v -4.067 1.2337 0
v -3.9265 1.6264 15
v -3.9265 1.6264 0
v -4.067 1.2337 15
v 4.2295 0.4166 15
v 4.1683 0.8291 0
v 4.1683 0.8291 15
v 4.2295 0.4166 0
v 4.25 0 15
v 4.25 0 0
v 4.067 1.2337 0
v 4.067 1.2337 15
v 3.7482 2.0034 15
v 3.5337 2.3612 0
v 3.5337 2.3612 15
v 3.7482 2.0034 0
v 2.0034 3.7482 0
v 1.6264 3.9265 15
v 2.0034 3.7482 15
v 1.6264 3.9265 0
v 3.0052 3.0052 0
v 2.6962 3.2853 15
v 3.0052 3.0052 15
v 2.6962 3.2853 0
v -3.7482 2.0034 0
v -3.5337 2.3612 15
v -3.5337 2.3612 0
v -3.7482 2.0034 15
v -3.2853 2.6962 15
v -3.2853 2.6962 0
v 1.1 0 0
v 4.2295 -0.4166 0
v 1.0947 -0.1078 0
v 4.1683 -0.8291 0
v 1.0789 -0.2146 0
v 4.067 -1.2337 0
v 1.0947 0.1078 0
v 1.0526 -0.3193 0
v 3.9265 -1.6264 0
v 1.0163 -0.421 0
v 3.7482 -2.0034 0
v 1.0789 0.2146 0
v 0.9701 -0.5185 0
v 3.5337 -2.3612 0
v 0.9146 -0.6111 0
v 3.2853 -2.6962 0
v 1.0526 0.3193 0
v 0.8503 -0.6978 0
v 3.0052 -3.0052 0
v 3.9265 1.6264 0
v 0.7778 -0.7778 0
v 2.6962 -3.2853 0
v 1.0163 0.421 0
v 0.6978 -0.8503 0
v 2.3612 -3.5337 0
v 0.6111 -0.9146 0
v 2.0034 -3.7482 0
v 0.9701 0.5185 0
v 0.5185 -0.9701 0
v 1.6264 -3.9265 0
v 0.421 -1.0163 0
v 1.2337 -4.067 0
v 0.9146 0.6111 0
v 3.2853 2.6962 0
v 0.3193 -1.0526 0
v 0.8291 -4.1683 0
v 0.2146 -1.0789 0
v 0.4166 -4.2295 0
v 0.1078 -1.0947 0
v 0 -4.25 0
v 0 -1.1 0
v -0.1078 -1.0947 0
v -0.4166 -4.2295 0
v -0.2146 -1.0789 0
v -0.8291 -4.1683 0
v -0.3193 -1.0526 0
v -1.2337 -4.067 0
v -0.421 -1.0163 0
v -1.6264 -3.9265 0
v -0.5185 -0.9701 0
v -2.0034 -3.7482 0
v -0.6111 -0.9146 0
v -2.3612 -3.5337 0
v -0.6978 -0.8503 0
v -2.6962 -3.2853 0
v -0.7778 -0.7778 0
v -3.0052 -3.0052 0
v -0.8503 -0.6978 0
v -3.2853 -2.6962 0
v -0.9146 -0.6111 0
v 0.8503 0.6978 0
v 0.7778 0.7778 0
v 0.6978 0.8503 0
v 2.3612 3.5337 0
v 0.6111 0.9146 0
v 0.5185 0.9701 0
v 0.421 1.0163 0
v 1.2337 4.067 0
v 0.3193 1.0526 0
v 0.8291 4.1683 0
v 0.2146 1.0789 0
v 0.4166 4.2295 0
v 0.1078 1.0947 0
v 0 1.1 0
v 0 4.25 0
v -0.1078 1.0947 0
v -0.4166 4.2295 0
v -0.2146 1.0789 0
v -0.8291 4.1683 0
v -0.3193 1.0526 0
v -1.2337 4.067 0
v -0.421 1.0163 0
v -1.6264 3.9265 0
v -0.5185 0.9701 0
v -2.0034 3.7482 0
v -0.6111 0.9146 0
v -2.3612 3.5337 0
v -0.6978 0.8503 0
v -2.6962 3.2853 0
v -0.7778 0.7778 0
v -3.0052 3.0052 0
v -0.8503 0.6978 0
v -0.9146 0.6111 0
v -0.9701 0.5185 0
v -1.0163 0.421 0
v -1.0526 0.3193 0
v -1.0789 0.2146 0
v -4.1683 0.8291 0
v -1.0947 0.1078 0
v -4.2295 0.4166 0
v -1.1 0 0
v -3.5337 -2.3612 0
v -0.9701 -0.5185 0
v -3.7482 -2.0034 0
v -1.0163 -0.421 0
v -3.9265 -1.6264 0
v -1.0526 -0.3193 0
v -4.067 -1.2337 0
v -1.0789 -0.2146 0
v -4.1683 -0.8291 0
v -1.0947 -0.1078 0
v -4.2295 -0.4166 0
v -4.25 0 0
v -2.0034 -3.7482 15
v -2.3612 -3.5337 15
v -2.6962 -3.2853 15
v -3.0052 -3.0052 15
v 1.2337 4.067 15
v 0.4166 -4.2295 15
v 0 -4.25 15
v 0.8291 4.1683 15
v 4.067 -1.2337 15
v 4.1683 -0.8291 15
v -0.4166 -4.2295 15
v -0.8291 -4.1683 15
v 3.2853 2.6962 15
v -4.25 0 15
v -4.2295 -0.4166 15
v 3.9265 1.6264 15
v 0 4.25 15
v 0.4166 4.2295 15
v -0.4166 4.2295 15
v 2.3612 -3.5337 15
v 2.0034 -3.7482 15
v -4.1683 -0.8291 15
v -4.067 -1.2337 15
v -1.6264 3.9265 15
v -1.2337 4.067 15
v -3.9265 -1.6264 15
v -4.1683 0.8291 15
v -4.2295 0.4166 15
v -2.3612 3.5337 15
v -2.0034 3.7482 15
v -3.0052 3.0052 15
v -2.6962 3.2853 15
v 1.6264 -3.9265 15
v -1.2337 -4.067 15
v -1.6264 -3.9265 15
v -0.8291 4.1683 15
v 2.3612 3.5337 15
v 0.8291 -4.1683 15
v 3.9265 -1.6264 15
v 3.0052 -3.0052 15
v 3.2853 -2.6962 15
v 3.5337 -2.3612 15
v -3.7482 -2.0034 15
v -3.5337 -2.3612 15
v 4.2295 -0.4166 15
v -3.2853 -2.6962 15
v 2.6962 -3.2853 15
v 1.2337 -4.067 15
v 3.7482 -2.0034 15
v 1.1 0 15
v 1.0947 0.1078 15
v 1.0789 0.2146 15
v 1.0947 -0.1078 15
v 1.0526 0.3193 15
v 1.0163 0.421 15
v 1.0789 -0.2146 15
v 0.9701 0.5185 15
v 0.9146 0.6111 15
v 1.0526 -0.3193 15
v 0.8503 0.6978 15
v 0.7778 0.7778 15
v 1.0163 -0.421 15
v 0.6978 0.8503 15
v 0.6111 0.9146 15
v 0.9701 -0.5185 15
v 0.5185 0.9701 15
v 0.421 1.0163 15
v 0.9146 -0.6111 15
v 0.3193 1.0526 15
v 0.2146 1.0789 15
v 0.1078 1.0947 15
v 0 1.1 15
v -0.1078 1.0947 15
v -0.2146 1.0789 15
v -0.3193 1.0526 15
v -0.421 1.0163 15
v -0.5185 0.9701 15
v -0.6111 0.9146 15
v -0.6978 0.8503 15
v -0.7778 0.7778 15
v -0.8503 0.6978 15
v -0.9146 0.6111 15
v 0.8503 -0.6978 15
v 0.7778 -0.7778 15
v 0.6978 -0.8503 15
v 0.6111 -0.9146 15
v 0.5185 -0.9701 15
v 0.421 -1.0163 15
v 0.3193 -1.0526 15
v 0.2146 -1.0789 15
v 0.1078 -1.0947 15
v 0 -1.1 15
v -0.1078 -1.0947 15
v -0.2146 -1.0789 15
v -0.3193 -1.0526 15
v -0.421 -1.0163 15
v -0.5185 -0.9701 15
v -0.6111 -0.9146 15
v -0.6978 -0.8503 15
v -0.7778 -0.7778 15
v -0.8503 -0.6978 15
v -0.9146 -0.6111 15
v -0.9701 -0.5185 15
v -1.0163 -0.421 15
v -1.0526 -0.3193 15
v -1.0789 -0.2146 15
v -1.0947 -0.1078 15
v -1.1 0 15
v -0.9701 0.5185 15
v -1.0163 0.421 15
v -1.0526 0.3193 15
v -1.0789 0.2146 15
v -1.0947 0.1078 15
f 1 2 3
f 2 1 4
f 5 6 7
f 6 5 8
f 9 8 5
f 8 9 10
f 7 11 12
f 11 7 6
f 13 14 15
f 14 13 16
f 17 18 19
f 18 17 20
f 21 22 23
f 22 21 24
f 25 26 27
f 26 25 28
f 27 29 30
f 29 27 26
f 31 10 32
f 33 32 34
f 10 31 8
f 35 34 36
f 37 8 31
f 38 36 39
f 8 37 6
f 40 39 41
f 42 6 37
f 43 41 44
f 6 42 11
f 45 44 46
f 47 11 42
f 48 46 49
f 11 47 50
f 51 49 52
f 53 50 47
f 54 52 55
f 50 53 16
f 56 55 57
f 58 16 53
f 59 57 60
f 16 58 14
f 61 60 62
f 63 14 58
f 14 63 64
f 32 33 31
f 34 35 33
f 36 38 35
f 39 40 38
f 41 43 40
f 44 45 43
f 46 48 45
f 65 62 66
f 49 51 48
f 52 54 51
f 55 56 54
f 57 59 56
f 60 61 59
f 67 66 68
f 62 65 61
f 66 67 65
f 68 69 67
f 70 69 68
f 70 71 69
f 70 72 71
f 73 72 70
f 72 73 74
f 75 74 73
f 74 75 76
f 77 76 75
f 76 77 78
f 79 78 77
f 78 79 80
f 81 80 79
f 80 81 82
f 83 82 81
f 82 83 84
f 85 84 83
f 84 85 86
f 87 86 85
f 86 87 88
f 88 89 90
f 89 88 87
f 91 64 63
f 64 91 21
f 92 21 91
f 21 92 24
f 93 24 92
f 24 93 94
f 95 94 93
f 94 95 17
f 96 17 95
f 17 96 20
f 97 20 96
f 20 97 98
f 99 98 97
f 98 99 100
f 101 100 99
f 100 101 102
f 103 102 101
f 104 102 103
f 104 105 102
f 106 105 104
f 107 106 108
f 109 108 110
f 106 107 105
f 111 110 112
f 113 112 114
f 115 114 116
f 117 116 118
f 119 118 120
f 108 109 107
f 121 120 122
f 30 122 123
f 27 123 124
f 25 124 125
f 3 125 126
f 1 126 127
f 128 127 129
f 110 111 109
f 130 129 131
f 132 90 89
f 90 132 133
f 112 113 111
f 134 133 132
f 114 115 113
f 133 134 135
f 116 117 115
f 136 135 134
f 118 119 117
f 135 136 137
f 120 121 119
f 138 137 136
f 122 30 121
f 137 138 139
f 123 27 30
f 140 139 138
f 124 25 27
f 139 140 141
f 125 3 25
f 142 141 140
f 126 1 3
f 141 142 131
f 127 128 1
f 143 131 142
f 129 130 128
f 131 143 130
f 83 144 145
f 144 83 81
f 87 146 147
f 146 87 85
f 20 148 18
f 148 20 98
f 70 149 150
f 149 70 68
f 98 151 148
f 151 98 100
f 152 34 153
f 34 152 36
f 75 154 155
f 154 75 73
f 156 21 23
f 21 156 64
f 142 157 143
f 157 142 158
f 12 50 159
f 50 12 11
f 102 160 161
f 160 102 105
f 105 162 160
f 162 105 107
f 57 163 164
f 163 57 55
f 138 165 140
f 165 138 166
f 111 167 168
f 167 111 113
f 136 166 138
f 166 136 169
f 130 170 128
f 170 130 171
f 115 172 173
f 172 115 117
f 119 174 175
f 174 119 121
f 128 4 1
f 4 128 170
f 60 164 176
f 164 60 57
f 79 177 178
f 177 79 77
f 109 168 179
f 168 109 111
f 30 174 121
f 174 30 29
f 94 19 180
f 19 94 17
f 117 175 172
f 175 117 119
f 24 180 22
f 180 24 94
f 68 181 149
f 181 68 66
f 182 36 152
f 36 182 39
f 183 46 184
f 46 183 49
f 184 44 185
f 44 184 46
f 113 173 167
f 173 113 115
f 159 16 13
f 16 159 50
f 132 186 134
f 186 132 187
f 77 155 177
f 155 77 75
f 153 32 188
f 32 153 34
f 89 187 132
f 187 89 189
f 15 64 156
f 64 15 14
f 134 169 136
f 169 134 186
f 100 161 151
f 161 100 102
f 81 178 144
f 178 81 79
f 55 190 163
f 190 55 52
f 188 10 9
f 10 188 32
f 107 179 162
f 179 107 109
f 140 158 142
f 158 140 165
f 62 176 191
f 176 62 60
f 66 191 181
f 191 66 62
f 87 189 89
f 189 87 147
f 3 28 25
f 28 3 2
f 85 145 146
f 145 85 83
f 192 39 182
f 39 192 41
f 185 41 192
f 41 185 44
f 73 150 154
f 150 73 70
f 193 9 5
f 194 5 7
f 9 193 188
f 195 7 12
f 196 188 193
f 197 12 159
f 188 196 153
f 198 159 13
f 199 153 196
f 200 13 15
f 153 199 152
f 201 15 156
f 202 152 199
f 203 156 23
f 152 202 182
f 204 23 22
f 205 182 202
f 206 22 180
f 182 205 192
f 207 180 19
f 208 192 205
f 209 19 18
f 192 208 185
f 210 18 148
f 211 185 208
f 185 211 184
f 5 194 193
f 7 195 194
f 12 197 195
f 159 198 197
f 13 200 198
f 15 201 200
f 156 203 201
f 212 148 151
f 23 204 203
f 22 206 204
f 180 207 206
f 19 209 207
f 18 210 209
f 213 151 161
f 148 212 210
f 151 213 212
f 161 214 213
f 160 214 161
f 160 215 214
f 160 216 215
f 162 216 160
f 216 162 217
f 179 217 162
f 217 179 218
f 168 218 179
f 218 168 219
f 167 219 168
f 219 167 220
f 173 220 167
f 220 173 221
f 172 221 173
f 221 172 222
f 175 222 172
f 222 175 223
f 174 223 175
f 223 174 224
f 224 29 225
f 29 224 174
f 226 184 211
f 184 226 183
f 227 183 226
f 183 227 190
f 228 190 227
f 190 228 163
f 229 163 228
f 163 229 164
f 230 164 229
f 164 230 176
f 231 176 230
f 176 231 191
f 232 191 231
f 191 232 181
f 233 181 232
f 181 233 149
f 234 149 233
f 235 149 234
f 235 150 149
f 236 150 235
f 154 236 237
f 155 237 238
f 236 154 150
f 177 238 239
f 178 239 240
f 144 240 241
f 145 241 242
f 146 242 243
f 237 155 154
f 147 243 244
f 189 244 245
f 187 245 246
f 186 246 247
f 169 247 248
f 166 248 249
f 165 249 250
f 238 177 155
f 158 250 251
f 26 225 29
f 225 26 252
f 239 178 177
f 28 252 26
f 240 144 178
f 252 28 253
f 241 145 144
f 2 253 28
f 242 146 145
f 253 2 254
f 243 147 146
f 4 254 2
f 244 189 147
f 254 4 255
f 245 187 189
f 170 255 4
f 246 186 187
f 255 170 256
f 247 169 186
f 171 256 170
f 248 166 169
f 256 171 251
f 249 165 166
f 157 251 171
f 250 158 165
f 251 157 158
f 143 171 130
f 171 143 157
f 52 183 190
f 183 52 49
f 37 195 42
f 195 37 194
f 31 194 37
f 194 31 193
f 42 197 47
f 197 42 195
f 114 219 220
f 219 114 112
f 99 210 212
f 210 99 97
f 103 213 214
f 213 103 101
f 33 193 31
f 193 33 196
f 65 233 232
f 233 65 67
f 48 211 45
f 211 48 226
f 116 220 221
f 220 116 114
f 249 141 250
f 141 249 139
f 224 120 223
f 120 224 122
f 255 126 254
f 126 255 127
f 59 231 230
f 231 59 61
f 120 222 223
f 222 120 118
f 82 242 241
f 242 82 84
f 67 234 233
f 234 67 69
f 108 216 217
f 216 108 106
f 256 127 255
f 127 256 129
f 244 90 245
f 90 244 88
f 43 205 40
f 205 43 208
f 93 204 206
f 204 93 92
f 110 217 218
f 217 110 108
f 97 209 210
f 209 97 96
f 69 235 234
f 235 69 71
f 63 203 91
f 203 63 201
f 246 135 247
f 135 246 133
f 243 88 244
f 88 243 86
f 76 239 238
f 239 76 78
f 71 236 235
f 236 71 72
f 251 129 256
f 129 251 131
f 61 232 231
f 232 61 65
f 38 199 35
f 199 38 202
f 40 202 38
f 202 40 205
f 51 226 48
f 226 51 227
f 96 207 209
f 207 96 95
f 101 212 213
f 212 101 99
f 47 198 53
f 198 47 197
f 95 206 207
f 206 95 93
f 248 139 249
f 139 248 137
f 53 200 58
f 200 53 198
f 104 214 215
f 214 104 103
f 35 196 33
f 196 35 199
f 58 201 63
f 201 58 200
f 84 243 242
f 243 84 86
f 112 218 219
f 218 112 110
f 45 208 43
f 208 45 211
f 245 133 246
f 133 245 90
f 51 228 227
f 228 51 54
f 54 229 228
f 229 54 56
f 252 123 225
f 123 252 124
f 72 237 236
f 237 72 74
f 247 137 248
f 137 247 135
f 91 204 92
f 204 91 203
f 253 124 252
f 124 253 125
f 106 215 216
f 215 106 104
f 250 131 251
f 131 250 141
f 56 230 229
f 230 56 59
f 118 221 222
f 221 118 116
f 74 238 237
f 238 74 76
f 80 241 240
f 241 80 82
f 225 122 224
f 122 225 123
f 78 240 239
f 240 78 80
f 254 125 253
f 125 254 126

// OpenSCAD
difference(){
cylinder(h=15,d=8.5,$fn=64);
    translate([0,0,-2])
        cylinder(h=18,d=2.2,$fn=64);

}
